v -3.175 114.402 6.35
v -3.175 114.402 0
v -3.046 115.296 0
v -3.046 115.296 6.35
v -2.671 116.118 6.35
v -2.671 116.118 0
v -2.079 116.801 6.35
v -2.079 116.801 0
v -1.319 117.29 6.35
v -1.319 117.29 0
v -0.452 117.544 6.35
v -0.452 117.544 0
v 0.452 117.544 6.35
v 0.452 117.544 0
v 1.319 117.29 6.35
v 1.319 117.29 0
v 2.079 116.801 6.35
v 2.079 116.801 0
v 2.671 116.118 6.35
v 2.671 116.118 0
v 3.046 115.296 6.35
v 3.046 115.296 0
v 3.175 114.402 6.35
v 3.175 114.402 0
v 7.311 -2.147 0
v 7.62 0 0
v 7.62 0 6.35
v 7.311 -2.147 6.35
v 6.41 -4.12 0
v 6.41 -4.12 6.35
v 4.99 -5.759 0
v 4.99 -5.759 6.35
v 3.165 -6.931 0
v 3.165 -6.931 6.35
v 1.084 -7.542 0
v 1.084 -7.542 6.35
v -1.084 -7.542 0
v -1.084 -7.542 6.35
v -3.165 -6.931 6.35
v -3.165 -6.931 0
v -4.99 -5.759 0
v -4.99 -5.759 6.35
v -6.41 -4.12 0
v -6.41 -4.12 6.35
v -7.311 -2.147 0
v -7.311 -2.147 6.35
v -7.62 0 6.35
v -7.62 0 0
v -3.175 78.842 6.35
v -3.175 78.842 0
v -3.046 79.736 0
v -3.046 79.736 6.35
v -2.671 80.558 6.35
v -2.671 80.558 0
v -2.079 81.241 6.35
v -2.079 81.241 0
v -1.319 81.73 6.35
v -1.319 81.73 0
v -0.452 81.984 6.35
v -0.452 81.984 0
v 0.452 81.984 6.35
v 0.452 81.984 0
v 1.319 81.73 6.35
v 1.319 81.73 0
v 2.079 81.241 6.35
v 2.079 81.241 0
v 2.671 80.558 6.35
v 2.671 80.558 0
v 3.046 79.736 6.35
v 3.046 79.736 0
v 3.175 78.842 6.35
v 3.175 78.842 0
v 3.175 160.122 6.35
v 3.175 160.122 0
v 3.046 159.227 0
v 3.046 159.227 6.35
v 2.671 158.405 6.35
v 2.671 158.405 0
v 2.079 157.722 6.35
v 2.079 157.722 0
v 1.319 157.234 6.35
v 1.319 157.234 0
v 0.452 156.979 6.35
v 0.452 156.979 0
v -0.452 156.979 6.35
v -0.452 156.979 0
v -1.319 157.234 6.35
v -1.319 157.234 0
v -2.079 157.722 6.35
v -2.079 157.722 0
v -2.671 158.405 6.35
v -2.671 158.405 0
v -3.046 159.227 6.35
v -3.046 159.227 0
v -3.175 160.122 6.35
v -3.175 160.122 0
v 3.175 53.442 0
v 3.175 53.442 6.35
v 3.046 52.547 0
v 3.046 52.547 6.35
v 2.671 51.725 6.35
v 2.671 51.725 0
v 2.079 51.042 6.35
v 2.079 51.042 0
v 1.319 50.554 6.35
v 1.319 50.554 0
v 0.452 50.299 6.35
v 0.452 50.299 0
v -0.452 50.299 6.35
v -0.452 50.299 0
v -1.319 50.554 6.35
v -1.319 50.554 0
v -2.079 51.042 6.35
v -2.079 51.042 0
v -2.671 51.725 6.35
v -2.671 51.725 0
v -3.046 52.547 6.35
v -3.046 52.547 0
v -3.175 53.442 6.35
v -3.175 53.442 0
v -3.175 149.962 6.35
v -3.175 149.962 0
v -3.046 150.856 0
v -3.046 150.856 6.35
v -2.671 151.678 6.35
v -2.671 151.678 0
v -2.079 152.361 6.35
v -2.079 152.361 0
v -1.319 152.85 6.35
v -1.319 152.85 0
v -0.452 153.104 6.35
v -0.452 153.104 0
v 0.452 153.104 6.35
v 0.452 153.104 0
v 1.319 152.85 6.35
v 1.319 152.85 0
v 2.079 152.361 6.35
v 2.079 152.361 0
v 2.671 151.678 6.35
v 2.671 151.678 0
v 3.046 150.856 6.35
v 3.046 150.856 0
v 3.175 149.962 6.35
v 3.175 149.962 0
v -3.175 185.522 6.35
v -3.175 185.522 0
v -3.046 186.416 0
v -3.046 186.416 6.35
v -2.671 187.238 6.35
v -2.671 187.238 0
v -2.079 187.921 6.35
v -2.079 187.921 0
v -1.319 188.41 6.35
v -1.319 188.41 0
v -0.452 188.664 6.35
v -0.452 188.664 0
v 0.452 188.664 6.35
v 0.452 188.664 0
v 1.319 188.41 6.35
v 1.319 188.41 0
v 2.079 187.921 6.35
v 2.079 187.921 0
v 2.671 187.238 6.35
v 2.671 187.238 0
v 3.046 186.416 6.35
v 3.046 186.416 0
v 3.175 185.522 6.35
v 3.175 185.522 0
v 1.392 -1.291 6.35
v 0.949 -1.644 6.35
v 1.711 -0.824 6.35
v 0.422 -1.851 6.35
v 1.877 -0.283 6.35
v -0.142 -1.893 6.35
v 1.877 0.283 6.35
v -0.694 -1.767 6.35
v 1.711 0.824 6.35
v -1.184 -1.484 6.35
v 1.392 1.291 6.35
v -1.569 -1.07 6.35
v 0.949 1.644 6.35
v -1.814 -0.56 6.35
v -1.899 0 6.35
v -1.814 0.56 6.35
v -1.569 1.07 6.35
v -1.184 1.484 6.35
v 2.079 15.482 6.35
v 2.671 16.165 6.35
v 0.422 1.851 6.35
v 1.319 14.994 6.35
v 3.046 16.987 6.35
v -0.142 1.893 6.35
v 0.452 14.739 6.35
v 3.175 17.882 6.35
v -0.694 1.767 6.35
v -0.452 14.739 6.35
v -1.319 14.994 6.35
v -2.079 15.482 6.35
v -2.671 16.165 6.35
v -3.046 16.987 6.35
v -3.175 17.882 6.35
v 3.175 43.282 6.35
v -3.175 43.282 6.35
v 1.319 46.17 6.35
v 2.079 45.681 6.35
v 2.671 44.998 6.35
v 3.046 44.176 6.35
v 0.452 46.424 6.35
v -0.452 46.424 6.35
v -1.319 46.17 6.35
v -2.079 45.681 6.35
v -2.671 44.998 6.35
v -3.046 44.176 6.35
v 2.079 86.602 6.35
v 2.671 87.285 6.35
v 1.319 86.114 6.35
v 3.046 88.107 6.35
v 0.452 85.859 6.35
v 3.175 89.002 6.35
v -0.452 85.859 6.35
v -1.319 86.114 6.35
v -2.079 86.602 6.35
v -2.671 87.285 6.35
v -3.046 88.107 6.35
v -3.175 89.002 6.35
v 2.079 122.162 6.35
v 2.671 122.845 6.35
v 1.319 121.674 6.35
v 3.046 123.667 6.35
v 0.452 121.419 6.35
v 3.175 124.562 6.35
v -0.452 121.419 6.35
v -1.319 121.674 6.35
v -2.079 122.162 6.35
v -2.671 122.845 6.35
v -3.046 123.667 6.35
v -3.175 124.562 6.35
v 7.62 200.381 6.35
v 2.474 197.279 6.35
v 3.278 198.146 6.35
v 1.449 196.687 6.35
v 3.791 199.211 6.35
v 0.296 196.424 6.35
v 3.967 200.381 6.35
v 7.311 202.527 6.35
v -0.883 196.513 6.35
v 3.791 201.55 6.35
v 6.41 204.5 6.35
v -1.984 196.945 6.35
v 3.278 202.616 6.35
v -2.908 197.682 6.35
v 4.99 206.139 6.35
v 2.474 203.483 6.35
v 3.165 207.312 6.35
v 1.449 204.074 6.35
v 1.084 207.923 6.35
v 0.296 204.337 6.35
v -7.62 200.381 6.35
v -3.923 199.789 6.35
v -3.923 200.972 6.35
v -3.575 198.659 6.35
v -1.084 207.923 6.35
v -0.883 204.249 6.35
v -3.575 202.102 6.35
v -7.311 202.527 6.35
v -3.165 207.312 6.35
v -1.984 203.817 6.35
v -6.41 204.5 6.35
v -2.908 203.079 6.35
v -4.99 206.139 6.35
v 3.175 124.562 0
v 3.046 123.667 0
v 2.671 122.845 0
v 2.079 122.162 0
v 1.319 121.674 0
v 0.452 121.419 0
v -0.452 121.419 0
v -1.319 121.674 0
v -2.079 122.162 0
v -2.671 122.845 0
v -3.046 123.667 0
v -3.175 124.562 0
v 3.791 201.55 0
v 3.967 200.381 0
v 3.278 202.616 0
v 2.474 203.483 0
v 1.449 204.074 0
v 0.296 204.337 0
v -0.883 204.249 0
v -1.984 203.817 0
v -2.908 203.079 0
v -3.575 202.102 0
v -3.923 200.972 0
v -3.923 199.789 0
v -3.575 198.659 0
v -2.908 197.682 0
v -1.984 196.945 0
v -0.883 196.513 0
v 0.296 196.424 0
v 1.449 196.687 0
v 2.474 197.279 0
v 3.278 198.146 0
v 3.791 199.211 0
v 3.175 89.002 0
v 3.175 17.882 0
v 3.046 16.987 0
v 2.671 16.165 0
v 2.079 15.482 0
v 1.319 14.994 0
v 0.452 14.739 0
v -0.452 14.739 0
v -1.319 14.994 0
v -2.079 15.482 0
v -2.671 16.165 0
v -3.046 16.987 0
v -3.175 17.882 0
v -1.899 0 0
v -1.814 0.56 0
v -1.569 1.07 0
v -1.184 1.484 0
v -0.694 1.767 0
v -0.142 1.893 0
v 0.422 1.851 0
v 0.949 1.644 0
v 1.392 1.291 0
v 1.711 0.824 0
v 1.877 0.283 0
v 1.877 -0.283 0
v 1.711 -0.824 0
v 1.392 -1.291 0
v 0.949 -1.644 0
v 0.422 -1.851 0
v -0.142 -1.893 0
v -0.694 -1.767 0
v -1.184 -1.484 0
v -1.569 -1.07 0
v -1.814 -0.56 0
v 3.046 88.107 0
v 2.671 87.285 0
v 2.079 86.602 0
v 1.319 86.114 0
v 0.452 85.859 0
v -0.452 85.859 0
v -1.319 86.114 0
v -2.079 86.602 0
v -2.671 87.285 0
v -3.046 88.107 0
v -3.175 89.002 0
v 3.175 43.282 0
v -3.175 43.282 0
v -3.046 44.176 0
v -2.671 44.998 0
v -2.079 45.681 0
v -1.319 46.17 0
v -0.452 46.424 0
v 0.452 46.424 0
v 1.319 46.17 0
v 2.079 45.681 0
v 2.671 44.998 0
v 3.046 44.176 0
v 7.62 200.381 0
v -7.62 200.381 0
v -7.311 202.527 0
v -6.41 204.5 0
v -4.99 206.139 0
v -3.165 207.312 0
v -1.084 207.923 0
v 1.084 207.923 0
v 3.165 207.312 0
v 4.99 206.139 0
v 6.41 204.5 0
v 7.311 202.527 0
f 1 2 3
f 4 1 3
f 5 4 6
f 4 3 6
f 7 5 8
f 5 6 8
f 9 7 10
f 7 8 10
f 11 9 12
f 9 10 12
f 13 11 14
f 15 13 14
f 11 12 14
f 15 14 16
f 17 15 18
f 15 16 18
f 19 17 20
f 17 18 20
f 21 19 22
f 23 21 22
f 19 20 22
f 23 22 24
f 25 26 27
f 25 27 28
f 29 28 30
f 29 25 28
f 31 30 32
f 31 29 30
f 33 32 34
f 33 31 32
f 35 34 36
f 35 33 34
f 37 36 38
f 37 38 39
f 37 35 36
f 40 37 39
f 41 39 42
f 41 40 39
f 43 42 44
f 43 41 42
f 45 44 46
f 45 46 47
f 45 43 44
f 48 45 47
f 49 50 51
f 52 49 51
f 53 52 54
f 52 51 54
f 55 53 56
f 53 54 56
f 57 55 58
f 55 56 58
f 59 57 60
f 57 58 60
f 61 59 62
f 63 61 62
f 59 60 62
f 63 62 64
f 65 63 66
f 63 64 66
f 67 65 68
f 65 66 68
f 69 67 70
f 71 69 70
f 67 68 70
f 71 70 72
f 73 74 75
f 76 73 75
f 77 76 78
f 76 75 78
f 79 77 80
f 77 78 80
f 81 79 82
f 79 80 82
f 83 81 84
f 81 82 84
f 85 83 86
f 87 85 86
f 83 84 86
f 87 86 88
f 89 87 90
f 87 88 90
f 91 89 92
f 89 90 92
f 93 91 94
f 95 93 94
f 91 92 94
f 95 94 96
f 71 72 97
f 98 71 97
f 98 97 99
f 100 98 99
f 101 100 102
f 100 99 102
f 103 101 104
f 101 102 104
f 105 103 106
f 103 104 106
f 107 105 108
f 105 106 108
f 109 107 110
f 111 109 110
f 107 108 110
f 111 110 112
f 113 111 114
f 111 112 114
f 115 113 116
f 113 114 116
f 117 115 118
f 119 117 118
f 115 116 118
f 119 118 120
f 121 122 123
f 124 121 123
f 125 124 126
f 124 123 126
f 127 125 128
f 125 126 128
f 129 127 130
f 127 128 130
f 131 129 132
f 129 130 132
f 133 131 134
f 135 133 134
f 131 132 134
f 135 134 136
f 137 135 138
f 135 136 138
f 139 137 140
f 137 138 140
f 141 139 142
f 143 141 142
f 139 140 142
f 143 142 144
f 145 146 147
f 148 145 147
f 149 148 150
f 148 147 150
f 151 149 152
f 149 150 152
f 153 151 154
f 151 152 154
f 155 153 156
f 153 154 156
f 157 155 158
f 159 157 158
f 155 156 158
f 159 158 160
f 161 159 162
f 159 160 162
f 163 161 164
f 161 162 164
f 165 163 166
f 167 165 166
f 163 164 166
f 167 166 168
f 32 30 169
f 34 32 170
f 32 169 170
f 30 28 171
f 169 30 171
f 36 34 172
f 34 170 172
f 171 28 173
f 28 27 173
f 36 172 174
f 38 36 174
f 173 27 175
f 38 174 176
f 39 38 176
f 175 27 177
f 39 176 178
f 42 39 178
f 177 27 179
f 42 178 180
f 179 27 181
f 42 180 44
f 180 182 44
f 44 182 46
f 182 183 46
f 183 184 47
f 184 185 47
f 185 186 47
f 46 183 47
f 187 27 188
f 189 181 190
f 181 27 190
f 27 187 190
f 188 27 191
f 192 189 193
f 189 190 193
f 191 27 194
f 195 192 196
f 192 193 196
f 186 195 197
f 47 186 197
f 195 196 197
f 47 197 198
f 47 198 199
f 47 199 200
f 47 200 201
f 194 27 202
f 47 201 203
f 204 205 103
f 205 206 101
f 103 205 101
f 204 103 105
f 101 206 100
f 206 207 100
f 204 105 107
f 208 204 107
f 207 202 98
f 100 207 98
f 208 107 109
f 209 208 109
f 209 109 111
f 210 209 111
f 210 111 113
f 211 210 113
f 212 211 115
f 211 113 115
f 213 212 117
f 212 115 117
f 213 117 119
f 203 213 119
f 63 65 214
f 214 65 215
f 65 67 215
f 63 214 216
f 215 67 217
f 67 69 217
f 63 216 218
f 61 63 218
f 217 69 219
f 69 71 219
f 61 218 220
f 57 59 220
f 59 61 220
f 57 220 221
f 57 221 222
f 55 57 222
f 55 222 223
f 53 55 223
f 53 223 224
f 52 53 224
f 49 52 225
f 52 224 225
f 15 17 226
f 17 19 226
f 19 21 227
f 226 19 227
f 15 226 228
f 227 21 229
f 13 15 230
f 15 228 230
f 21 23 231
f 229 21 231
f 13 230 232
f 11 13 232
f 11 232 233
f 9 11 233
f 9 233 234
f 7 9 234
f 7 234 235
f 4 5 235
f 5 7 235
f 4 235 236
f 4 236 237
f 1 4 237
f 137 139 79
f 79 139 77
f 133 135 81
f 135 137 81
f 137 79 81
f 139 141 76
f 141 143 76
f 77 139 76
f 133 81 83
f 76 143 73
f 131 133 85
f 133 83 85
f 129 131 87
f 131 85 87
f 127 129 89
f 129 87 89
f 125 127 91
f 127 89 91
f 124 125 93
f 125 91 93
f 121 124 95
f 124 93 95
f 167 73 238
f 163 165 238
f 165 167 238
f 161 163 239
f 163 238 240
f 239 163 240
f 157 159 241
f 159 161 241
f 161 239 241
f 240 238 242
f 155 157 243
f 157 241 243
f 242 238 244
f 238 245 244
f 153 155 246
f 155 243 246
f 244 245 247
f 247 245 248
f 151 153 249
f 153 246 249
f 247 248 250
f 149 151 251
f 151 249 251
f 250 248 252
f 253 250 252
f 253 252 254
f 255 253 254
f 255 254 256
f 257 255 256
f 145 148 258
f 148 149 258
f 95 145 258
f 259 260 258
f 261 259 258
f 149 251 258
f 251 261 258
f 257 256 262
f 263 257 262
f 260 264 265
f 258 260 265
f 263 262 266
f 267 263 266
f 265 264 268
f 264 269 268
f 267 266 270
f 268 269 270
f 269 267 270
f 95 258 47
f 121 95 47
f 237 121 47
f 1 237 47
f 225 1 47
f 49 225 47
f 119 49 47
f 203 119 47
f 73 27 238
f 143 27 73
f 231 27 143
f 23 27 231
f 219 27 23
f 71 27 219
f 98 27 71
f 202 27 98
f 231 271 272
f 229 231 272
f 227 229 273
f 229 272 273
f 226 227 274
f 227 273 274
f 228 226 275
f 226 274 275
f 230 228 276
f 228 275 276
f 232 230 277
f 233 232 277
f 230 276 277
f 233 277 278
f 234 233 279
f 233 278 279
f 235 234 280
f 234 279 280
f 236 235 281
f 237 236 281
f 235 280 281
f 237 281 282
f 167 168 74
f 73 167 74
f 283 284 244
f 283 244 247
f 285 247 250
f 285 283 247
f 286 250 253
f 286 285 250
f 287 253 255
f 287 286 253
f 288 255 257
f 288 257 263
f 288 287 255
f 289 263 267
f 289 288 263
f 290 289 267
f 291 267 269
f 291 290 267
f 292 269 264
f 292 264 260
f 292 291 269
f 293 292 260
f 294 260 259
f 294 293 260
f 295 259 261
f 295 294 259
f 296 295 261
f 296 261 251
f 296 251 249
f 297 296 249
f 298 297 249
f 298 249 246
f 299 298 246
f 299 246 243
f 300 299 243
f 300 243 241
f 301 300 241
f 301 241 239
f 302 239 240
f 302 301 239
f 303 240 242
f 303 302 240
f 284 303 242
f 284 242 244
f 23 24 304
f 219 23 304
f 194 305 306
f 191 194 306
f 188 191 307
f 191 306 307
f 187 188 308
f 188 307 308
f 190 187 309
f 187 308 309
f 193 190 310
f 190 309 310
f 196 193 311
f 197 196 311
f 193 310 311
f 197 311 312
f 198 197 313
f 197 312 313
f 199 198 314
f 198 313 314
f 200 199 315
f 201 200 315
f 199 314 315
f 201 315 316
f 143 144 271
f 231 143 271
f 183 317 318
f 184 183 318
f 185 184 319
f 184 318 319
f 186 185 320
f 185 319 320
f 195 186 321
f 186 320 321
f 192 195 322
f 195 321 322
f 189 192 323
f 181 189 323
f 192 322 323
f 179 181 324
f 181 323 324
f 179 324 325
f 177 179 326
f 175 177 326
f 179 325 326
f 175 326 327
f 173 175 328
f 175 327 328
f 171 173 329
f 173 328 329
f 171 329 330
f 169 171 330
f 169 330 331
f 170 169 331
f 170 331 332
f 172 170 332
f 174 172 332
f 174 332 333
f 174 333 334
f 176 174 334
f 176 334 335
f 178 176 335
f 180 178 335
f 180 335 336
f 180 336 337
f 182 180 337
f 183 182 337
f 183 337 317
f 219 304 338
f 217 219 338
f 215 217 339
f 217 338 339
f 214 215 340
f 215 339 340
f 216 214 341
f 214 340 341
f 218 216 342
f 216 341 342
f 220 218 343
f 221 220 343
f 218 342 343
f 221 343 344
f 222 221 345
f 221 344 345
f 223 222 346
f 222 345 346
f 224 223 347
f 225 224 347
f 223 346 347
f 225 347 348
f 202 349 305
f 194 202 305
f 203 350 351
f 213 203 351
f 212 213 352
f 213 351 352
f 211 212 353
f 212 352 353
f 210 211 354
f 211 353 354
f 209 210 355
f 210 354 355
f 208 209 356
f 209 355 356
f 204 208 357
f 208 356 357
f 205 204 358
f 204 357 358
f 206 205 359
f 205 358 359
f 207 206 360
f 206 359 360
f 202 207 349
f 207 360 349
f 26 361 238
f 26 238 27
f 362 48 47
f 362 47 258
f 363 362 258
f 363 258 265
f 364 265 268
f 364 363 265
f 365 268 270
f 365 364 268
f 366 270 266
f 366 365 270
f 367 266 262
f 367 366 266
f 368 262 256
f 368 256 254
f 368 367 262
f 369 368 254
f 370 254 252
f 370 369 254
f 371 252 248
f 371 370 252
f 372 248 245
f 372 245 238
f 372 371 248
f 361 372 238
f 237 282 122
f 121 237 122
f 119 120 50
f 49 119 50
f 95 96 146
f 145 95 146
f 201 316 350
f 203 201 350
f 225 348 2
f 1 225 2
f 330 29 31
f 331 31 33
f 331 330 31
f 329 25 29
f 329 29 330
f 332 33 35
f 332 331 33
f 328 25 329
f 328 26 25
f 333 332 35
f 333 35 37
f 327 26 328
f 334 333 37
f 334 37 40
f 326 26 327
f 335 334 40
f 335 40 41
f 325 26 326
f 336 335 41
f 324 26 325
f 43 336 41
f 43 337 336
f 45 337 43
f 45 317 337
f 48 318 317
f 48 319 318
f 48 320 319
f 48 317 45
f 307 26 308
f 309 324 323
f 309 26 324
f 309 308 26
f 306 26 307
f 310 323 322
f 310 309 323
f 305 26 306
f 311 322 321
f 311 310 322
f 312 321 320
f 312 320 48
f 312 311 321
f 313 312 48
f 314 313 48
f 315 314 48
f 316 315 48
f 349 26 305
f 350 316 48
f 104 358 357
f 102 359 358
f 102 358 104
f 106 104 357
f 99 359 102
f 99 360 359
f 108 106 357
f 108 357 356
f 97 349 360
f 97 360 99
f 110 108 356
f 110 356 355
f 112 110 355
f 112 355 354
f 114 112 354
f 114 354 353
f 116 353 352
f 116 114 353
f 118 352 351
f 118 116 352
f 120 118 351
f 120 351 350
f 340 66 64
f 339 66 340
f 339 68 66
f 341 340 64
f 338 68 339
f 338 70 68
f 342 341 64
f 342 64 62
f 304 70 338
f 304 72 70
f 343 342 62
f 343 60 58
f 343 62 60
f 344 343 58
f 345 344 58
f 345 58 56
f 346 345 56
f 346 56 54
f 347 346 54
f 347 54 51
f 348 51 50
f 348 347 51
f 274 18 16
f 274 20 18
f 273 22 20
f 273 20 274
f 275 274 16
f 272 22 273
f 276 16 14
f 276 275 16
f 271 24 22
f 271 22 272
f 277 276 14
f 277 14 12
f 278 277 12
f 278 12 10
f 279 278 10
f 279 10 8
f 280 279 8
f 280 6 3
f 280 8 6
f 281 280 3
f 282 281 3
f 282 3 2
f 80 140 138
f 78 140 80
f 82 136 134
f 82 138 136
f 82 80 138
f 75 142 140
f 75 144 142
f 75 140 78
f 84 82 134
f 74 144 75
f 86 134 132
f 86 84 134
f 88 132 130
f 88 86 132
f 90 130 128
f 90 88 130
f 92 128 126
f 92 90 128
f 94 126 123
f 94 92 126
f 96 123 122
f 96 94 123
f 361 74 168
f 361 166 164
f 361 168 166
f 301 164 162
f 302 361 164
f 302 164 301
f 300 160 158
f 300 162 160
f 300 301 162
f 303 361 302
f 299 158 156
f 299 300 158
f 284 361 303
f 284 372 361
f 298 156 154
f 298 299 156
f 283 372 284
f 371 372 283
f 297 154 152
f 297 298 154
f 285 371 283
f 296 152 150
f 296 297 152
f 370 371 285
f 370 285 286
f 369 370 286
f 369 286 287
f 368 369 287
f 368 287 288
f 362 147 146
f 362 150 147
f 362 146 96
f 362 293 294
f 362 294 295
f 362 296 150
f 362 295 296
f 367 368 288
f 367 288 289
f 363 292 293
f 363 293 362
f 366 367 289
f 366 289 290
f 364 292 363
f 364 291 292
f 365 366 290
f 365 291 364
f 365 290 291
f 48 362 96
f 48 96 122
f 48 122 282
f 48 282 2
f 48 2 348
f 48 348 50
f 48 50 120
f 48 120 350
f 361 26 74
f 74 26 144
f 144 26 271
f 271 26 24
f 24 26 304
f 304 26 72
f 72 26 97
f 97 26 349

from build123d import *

# Parameters (mm, degrees)
SKETCH_2_R             = 3.96748
EXTRUDE_1_DEPTH        = 6.35
F_10_24_TAPPED_HOLE1_D = 3.7973


with BuildPart() as part:
    # 草图2 → 凸台-拉伸1 (new body)
    with BuildSketch(Plane.XY):
        with BuildLine():
            Line((-7.62, 0), (-7.62, 200.3806))
            ThreePointArc((-7.62, 200.3806), (0, 208.0006), (7.62, 200.3806))
            Line((7.62, 200.3806), (7.62, 0))
            ThreePointArc((7.62, 0), (0, -7.62), (-7.62, 0))
        make_face()
        with Locations((0, 200.3806)):
            Circle(SKETCH_2_R, mode=Mode.SUBTRACT)
        with BuildLine():
            Line((3.175, 185.5216), (3.175, 160.1216))
            ThreePointArc((3.175, 160.1216), (0, 156.9466), (-3.175, 160.1216))
            Line((-3.175, 160.1216), (-3.175, 185.5216))
            ThreePointArc((-3.175, 185.5216), (0, 188.6966), (3.175, 185.5216))
        make_face(mode=Mode.SUBTRACT)
        with BuildLine():
            Line((3.175, 149.9616), (3.175, 124.5616))
            ThreePointArc((3.175, 124.5616), (0, 121.3866), (-3.175, 124.5616))
            Line((-3.175, 124.5616), (-3.175, 149.9616))
            ThreePointArc((-3.175, 149.9616), (0, 153.1366), (3.175, 149.9616))
        make_face(mode=Mode.SUBTRACT)
        with BuildLine():
            Line((3.175, 114.4016), (3.175, 89.0016))
            ThreePointArc((3.175, 89.0016), (0, 85.8266), (-3.175, 89.0016))
            Line((-3.175, 89.0016), (-3.175, 114.4016))
            ThreePointArc((-3.175, 114.4016), (0, 117.5766), (3.175, 114.4016))
        make_face(mode=Mode.SUBTRACT)
        with BuildLine():
            Line((3.175, 78.8416), (3.175, 53.4416))
            ThreePointArc((3.175, 53.4416), (0, 50.2666), (-3.175, 53.4416))
            Line((-3.175, 53.4416), (-3.175, 78.8416))
            ThreePointArc((-3.175, 78.8416), (0, 82.0166), (3.175, 78.8416))
        make_face(mode=Mode.SUBTRACT)
        with BuildLine():
            Line((3.175, 43.2816), (3.175, 17.8816))
            ThreePointArc((3.175, 17.8816), (0, 14.7066), (-3.175, 17.8816))
            Line((-3.175, 17.8816), (-3.175, 43.2816))
            ThreePointArc((-3.175, 43.2816), (0, 46.4566), (3.175, 43.2816))
        make_face(mode=Mode.SUBTRACT)
    extrude(amount=EXTRUDE_1_DEPTH)

    # #10-24 Tapped Hole1 (through all)
    with Locations(Plane.XY.offset(6.35)):
        with Locations((0, 0)):
            Hole(F_10_24_TAPPED_HOLE1_D / 2)


solid = part.part
